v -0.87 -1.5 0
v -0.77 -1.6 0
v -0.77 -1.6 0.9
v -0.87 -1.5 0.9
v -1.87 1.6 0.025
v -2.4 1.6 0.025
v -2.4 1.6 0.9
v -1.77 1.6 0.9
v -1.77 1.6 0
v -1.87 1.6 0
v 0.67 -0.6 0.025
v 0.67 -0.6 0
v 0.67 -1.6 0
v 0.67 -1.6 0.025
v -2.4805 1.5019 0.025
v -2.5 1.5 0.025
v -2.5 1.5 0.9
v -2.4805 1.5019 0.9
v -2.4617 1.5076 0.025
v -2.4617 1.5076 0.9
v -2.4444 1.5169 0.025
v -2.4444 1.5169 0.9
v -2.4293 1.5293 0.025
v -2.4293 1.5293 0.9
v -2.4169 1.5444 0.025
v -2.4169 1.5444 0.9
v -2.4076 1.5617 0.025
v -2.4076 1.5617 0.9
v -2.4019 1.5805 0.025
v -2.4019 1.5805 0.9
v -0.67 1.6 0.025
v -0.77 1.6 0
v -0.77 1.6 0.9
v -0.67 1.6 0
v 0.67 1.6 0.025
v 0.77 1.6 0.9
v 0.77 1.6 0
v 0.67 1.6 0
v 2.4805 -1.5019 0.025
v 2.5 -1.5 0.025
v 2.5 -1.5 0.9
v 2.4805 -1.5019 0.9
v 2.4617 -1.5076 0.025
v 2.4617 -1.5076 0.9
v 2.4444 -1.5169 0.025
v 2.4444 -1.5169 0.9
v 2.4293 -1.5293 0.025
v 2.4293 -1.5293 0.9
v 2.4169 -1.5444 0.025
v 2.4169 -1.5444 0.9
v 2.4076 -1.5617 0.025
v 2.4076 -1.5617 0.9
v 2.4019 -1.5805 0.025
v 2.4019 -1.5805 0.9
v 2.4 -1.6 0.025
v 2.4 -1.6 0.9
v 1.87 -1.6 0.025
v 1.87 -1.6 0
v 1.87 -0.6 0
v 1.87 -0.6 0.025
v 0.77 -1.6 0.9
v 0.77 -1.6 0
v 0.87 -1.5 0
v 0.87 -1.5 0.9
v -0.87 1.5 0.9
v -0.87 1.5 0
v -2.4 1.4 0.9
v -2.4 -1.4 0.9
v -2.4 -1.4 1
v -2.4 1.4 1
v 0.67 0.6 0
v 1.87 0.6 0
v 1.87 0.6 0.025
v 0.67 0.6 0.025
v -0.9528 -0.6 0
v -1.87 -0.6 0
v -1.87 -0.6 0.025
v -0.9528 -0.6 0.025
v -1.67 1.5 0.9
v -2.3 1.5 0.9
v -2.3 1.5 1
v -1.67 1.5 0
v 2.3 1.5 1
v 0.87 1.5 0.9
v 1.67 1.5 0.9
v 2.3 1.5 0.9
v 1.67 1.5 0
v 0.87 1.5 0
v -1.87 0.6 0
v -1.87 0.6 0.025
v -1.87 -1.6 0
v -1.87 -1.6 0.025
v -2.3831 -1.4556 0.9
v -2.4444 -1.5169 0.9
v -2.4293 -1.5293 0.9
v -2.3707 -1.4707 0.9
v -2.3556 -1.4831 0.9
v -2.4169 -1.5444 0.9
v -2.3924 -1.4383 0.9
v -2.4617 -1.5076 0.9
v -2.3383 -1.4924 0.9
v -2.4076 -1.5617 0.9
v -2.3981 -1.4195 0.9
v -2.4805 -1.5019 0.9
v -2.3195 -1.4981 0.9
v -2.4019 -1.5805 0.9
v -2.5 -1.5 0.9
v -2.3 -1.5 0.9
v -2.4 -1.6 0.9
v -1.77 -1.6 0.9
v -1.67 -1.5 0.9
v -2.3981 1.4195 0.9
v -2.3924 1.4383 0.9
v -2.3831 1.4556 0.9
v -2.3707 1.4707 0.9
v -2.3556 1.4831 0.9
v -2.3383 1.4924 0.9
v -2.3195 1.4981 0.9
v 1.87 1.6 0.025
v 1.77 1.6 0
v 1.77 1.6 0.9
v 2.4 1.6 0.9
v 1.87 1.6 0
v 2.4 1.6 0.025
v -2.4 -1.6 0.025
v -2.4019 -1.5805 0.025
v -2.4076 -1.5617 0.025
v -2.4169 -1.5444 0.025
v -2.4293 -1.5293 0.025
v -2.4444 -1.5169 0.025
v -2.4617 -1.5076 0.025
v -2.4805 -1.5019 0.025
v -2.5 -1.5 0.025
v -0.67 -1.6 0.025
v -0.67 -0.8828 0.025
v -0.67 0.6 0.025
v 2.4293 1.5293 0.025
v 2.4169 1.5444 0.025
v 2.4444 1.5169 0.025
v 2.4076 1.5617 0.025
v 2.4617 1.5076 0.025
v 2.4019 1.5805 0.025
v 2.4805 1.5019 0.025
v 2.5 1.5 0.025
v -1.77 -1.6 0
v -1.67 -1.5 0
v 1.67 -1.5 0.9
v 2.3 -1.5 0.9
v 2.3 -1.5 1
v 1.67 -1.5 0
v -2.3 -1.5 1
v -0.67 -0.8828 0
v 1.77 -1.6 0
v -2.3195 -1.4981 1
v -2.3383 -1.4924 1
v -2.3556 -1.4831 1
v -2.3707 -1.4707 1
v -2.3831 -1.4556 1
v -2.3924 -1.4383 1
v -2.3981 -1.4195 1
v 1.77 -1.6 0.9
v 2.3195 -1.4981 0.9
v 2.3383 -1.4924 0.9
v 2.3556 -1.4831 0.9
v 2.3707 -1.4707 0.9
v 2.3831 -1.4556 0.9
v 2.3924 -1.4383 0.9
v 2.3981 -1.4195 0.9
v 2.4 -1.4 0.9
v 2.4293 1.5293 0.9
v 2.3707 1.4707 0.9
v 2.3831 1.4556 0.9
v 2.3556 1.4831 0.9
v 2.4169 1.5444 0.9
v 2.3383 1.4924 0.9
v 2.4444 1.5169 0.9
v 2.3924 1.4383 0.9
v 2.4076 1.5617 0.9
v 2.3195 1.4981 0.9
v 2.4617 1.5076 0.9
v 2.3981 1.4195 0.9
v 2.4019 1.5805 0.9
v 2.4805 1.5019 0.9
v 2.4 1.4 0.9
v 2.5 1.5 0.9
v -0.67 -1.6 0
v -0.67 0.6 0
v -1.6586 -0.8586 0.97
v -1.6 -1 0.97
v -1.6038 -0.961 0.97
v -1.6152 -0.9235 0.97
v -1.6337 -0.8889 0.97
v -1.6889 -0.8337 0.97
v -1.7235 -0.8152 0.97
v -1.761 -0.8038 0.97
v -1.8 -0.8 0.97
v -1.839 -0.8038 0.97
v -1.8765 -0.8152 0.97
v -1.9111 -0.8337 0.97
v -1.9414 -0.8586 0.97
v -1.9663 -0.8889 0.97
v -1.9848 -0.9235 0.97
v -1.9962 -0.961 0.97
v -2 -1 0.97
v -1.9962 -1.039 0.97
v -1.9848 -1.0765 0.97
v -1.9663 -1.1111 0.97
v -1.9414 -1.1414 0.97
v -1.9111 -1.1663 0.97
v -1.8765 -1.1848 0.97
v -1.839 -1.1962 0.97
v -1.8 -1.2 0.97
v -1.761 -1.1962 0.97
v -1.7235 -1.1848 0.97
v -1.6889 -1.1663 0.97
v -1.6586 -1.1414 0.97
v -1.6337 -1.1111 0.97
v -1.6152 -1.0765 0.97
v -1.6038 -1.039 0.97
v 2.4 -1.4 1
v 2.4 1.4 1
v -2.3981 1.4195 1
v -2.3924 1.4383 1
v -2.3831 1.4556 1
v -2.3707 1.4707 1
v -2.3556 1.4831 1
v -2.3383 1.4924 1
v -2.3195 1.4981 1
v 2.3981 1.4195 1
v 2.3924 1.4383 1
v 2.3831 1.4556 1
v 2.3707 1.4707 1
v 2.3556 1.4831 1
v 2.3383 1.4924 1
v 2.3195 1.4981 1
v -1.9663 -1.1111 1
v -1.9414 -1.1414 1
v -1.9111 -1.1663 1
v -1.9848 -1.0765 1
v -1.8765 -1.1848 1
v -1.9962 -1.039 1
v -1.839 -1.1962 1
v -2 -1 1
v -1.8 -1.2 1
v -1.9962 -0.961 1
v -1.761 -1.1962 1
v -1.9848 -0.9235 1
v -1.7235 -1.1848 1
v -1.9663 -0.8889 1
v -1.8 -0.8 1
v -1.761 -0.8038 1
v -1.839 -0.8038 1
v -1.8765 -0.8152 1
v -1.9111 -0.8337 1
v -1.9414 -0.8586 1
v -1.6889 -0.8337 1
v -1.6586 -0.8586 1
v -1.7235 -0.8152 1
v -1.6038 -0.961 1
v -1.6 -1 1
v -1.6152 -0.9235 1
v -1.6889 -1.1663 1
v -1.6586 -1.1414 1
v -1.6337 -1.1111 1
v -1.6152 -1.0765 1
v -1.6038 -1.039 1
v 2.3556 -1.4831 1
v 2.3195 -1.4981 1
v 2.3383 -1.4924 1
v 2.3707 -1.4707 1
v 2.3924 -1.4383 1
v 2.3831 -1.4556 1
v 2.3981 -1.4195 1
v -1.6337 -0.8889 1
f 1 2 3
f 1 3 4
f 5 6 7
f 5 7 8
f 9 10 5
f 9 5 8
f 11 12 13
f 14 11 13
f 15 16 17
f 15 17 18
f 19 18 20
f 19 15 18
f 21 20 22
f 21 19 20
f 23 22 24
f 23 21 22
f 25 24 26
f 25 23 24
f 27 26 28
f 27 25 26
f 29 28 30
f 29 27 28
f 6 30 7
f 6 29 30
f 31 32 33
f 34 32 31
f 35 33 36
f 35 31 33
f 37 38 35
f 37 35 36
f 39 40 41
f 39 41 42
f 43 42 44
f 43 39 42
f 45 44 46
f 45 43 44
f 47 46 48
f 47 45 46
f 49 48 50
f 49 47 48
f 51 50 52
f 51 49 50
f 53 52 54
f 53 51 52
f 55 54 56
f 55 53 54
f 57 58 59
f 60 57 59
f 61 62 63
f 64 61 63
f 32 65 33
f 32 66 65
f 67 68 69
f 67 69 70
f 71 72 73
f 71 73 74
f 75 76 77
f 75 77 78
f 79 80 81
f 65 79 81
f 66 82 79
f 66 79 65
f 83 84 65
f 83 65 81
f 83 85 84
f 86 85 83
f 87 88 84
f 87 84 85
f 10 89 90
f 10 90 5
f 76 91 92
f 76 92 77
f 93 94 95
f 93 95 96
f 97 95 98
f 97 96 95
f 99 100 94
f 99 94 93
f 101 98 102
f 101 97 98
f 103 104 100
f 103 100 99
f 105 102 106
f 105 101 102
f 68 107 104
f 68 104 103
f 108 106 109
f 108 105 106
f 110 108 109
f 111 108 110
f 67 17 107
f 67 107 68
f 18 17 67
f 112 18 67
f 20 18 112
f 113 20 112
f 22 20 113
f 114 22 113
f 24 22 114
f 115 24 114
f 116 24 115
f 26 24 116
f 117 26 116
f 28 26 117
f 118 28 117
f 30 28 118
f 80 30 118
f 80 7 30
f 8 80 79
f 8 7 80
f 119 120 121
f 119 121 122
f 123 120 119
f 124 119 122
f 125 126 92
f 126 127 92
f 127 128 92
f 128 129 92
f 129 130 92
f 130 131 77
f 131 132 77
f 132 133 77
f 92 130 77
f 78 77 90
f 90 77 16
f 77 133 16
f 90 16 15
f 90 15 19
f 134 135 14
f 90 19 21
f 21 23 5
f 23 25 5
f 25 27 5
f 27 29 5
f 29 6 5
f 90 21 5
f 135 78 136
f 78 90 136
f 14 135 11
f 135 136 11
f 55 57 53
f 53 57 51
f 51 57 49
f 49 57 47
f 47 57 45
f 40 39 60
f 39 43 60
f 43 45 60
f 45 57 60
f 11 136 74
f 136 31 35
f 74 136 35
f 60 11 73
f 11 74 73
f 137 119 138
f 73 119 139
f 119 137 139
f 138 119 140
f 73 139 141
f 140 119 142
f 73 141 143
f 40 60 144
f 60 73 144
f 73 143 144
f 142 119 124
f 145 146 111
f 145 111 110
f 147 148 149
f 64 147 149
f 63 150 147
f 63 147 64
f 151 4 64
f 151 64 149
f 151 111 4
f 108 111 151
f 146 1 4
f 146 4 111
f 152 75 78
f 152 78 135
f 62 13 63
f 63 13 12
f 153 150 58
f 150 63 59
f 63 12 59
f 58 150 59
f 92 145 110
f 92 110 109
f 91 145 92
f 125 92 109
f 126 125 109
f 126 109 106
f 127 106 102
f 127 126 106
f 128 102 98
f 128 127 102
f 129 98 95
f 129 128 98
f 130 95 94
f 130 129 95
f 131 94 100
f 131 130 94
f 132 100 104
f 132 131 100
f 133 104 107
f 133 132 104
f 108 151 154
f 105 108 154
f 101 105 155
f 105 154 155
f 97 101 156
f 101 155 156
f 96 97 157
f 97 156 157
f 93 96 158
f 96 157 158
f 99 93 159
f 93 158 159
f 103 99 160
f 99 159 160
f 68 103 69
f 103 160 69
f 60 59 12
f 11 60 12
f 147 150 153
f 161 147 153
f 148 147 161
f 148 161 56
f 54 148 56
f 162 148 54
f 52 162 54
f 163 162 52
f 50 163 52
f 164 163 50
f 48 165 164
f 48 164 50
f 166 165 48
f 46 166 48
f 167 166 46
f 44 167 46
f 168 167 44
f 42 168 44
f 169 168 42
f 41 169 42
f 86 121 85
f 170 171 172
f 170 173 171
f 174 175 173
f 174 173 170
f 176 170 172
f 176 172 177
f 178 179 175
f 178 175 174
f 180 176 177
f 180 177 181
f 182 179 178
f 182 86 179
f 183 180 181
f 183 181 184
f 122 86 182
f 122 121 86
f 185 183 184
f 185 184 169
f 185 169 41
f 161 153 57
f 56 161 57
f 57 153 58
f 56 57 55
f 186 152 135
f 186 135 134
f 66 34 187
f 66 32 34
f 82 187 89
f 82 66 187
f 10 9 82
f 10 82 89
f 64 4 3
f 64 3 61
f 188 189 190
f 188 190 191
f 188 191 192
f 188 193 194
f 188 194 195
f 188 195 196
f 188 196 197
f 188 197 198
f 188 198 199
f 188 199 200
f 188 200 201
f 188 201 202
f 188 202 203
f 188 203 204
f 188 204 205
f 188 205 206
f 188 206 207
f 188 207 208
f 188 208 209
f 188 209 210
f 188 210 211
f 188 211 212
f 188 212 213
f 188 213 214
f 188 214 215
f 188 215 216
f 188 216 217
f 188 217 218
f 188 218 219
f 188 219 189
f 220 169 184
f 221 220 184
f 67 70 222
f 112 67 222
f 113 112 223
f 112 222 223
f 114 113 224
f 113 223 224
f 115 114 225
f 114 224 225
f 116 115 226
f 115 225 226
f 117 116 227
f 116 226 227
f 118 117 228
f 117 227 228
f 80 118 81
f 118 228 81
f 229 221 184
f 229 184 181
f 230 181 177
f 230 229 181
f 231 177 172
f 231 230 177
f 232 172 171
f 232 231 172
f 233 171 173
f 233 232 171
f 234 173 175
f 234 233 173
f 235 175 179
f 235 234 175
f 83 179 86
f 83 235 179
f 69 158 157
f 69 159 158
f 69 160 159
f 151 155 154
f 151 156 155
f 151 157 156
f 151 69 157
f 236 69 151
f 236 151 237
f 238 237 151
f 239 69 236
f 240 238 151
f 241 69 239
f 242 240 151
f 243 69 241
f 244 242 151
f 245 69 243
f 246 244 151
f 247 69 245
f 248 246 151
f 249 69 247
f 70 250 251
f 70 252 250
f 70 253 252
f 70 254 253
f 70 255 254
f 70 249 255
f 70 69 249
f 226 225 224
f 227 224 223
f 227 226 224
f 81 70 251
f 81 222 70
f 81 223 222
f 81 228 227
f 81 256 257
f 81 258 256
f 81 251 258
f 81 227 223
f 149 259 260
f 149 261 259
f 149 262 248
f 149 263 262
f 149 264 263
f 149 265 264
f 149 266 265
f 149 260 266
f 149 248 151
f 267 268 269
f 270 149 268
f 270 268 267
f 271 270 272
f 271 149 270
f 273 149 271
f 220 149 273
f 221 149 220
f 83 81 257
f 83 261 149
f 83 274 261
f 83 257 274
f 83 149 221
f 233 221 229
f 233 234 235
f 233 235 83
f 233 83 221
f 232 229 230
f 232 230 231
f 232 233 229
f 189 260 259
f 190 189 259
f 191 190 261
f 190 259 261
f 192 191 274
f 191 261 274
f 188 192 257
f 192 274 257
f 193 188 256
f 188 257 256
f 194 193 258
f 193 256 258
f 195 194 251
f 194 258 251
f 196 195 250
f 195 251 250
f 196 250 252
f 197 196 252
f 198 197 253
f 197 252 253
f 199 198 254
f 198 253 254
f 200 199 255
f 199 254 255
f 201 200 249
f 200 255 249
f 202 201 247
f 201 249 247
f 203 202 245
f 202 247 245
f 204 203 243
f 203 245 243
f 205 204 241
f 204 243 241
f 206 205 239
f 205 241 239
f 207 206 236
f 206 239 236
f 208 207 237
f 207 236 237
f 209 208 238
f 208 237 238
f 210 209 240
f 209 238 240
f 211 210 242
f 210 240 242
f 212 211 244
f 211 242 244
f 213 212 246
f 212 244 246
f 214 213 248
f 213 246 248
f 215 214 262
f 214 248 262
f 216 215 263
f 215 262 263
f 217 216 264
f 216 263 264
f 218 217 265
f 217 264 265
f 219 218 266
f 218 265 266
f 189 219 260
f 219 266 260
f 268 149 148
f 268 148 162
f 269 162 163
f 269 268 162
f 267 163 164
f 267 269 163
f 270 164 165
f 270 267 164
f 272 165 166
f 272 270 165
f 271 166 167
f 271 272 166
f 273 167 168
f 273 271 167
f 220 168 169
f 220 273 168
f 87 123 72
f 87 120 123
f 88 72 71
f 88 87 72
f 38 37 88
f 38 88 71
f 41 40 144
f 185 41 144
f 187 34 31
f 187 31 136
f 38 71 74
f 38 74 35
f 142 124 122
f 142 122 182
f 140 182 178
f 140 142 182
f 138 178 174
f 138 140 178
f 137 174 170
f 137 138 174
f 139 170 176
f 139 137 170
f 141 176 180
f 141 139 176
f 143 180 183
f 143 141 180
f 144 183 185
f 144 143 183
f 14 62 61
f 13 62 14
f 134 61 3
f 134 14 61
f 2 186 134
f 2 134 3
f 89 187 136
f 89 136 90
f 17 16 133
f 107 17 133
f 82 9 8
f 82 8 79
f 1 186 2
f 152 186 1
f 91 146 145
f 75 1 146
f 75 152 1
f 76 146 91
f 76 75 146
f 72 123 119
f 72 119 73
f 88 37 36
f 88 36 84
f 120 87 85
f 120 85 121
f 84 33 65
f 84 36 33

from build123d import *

# Parameters (mm, degrees)
PAD004_DEPTH = 0.025
PAD_DEPTH    = 0.85
PAD003_DEPTH = 0.75
SKETCH002_W  = 4.8
SKETCH002_H  = 3
PAD001_DEPTH = 0.125
FILLET_R     = 0.1
FILLET001_R  = 0.1
FILLET002_R  = 0.1
FILLET003_R  = 0.1
SKETCH005_R  = 0.2
POCKET_DEPTH = 0.03


with BuildPart() as bodycover:
    # Sketch006 → Pad004 (new body)
    with BuildSketch(Plane.XY.offset(0.875)):
        with BuildLine():
            Line((-1.77, -1.6), (-1.67, -1.5))
            Line((-1.67, -1.5), (-0.87, -1.5))
            Line((-0.87, -1.5), (-0.77, -1.6))
            Line((-0.77, -1.6), (0.77, -1.6))
            Line((0.77, -1.6), (0.87, -1.5))
            Line((0.87, -1.5), (1.67, -1.5))
            Line((1.67, -1.5), (1.77, -1.6))
            Line((1.77, -1.6), (2.4, -1.6))
            ThreePointArc((2.5, -1.5), (2.429289, -1.529289), (2.4, -1.6))
            Line((2.5, -1.5), (2.5, 1.5))
            ThreePointArc((2.4, 1.6), (2.429289, 1.529289), (2.5, 1.5))
            Line((1.77, 1.6), (2.4, 1.6))
            Line((1.67, 1.5), (1.77, 1.6))
            Line((0.87, 1.5), (1.67, 1.5))
            Line((0.77, 1.6), (0.87, 1.5))
            Line((-0.77, 1.6), (0.77, 1.6))
            Line((-0.87, 1.5), (-0.77, 1.6))
            Line((-1.67, 1.5), (-0.87, 1.5))
            Line((-1.77, 1.6), (-1.67, 1.5))
            Line((-2.4, 1.6), (-1.77, 1.6))
            ThreePointArc((-2.5, 1.5), (-2.429289, 1.529289), (-2.4, 1.6))
            Line((-2.5, 1.5), (-2.5, -1.5))
            ThreePointArc((-2.4, -1.6), (-2.429289, -1.529289), (-2.5, -1.5))
            Line((-2.4, -1.6), (-1.77, -1.6))
        make_face()
    extrude(amount=PAD004_DEPTH)


with BuildPart() as body:
    # Sketch → Pad (new body)
    with BuildSketch(Plane.XY.offset(0.025)):
        with BuildLine():
            Line((-1.77, -1.6), (-1.67, -1.5))
            Line((-1.67, -1.5), (-0.87, -1.5))
            Line((-0.87, -1.5), (-0.77, -1.6))
            Line((-0.77, -1.6), (0.77, -1.6))
            Line((0.77, -1.6), (0.87, -1.5))
            Line((0.87, -1.5), (1.67, -1.5))
            Line((1.67, -1.5), (1.77, -1.6))
            Line((1.77, -1.6), (2.4, -1.6))
            ThreePointArc((2.5, -1.5), (2.429289, -1.529289), (2.4, -1.6))
            Line((2.5, -1.5), (2.5, 1.5))
            ThreePointArc((2.4, 1.6), (2.429289, 1.529289), (2.5, 1.5))
            Line((1.77, 1.6), (2.4, 1.6))
            Line((1.67, 1.5), (1.77, 1.6))
            Line((0.87, 1.5), (1.67, 1.5))
            Line((0.77, 1.6), (0.87, 1.5))
            Line((-0.77, 1.6), (0.77, 1.6))
            Line((-0.87, 1.5), (-0.77, 1.6))
            Line((-1.67, 1.5), (-0.87, 1.5))
            Line((-1.77, 1.6), (-1.67, 1.5))
            Line((-2.4, 1.6), (-1.77, 1.6))
            ThreePointArc((-2.5, 1.5), (-2.429289, 1.529289), (-2.4, 1.6))
            Line((-2.5, 1.5), (-2.5, -1.5))
            ThreePointArc((-2.4, -1.6), (-2.429289, -1.529289), (-2.5, -1.5))
            Line((-2.4, -1.6), (-1.77, -1.6))
        make_face()
    extrude(amount=PAD_DEPTH)


with BuildPart() as pads:
    # Sketch004 → Pad003 (new body)
    with BuildSketch(Plane.XY):
        Polygon((-0.67, 1.6), (-0.67, 0.6), (-1.87, 0.6), (-1.87, 1.6), (-1.77, 1.6), (-1.67, 1.5), (-0.87, 1.5), (-0.77, 1.6), align=None)
        Polygon((1.87, 1.6), (1.87, 0.6), (0.67, 0.6), (0.67, 1.6), (0.77, 1.6), (0.87, 1.5), (1.67, 1.5), (1.77, 1.6), align=None)
        Polygon((1.87, -1.6), (1.87, -0.6), (0.67, -0.6), (0.67, -1.6), (0.77, -1.6), (0.87, -1.5), (1.67, -1.5), (1.77, -1.6), align=None)
        Polygon((-1.87, -1.6), (-1.87, -0.6), (-0.952843, -0.6), (-0.67, -0.882843), (-0.67, -1.6), (-0.77, -1.6), (-0.87, -1.5), (-1.67, -1.5), (-1.77, -1.6), align=None)
    extrude(amount=PAD003_DEPTH)


with BuildPart() as fusion:
    # Sketch002 → Pad001 (new body)
    with BuildSketch(Plane.XY.offset(0.875)):
        Rectangle(SKETCH002_W, SKETCH002_H)
    extrude(amount=PAD001_DEPTH)

    # Fillet
    fillet_edges = [fusion.edges().sort_by_distance(p)[0] for p in [
        (2.4, -1.5, 0.9375),
    ]]
    fillet(fillet_edges, radius=FILLET_R)

    # Fillet001
    fillet001_edges = [fusion.edges().sort_by_distance(p)[0] for p in [
        (2.4, 1.5, 0.9375),
    ]]
    fillet(fillet001_edges, radius=FILLET001_R)

    # Fillet002
    fillet002_edges = [fusion.edges().sort_by_distance(p)[0] for p in [
        (-2.4, -1.5, 0.9375),
    ]]
    fillet(fillet002_edges, radius=FILLET002_R)

    # Fillet003
    fillet003_edges = [fusion.edges().sort_by_distance(p)[0] for p in [
        (-2.4, 1.5, 0.9375),
    ]]
    fillet(fillet003_edges, radius=FILLET003_R)

    # Sketch005 → Pocket (cut)
    with BuildSketch(Plane.XY.offset(1)):
        with Locations((-1.8, -1)):
            Circle(SKETCH005_R)
    extrude(amount=-POCKET_DEPTH, mode=Mode.SUBTRACT)

    # Fusion: union BodyCover, Body, Pads
    add(bodycover.part)
    add(body.part)
    add(pads.part)


solid = fusion.part
